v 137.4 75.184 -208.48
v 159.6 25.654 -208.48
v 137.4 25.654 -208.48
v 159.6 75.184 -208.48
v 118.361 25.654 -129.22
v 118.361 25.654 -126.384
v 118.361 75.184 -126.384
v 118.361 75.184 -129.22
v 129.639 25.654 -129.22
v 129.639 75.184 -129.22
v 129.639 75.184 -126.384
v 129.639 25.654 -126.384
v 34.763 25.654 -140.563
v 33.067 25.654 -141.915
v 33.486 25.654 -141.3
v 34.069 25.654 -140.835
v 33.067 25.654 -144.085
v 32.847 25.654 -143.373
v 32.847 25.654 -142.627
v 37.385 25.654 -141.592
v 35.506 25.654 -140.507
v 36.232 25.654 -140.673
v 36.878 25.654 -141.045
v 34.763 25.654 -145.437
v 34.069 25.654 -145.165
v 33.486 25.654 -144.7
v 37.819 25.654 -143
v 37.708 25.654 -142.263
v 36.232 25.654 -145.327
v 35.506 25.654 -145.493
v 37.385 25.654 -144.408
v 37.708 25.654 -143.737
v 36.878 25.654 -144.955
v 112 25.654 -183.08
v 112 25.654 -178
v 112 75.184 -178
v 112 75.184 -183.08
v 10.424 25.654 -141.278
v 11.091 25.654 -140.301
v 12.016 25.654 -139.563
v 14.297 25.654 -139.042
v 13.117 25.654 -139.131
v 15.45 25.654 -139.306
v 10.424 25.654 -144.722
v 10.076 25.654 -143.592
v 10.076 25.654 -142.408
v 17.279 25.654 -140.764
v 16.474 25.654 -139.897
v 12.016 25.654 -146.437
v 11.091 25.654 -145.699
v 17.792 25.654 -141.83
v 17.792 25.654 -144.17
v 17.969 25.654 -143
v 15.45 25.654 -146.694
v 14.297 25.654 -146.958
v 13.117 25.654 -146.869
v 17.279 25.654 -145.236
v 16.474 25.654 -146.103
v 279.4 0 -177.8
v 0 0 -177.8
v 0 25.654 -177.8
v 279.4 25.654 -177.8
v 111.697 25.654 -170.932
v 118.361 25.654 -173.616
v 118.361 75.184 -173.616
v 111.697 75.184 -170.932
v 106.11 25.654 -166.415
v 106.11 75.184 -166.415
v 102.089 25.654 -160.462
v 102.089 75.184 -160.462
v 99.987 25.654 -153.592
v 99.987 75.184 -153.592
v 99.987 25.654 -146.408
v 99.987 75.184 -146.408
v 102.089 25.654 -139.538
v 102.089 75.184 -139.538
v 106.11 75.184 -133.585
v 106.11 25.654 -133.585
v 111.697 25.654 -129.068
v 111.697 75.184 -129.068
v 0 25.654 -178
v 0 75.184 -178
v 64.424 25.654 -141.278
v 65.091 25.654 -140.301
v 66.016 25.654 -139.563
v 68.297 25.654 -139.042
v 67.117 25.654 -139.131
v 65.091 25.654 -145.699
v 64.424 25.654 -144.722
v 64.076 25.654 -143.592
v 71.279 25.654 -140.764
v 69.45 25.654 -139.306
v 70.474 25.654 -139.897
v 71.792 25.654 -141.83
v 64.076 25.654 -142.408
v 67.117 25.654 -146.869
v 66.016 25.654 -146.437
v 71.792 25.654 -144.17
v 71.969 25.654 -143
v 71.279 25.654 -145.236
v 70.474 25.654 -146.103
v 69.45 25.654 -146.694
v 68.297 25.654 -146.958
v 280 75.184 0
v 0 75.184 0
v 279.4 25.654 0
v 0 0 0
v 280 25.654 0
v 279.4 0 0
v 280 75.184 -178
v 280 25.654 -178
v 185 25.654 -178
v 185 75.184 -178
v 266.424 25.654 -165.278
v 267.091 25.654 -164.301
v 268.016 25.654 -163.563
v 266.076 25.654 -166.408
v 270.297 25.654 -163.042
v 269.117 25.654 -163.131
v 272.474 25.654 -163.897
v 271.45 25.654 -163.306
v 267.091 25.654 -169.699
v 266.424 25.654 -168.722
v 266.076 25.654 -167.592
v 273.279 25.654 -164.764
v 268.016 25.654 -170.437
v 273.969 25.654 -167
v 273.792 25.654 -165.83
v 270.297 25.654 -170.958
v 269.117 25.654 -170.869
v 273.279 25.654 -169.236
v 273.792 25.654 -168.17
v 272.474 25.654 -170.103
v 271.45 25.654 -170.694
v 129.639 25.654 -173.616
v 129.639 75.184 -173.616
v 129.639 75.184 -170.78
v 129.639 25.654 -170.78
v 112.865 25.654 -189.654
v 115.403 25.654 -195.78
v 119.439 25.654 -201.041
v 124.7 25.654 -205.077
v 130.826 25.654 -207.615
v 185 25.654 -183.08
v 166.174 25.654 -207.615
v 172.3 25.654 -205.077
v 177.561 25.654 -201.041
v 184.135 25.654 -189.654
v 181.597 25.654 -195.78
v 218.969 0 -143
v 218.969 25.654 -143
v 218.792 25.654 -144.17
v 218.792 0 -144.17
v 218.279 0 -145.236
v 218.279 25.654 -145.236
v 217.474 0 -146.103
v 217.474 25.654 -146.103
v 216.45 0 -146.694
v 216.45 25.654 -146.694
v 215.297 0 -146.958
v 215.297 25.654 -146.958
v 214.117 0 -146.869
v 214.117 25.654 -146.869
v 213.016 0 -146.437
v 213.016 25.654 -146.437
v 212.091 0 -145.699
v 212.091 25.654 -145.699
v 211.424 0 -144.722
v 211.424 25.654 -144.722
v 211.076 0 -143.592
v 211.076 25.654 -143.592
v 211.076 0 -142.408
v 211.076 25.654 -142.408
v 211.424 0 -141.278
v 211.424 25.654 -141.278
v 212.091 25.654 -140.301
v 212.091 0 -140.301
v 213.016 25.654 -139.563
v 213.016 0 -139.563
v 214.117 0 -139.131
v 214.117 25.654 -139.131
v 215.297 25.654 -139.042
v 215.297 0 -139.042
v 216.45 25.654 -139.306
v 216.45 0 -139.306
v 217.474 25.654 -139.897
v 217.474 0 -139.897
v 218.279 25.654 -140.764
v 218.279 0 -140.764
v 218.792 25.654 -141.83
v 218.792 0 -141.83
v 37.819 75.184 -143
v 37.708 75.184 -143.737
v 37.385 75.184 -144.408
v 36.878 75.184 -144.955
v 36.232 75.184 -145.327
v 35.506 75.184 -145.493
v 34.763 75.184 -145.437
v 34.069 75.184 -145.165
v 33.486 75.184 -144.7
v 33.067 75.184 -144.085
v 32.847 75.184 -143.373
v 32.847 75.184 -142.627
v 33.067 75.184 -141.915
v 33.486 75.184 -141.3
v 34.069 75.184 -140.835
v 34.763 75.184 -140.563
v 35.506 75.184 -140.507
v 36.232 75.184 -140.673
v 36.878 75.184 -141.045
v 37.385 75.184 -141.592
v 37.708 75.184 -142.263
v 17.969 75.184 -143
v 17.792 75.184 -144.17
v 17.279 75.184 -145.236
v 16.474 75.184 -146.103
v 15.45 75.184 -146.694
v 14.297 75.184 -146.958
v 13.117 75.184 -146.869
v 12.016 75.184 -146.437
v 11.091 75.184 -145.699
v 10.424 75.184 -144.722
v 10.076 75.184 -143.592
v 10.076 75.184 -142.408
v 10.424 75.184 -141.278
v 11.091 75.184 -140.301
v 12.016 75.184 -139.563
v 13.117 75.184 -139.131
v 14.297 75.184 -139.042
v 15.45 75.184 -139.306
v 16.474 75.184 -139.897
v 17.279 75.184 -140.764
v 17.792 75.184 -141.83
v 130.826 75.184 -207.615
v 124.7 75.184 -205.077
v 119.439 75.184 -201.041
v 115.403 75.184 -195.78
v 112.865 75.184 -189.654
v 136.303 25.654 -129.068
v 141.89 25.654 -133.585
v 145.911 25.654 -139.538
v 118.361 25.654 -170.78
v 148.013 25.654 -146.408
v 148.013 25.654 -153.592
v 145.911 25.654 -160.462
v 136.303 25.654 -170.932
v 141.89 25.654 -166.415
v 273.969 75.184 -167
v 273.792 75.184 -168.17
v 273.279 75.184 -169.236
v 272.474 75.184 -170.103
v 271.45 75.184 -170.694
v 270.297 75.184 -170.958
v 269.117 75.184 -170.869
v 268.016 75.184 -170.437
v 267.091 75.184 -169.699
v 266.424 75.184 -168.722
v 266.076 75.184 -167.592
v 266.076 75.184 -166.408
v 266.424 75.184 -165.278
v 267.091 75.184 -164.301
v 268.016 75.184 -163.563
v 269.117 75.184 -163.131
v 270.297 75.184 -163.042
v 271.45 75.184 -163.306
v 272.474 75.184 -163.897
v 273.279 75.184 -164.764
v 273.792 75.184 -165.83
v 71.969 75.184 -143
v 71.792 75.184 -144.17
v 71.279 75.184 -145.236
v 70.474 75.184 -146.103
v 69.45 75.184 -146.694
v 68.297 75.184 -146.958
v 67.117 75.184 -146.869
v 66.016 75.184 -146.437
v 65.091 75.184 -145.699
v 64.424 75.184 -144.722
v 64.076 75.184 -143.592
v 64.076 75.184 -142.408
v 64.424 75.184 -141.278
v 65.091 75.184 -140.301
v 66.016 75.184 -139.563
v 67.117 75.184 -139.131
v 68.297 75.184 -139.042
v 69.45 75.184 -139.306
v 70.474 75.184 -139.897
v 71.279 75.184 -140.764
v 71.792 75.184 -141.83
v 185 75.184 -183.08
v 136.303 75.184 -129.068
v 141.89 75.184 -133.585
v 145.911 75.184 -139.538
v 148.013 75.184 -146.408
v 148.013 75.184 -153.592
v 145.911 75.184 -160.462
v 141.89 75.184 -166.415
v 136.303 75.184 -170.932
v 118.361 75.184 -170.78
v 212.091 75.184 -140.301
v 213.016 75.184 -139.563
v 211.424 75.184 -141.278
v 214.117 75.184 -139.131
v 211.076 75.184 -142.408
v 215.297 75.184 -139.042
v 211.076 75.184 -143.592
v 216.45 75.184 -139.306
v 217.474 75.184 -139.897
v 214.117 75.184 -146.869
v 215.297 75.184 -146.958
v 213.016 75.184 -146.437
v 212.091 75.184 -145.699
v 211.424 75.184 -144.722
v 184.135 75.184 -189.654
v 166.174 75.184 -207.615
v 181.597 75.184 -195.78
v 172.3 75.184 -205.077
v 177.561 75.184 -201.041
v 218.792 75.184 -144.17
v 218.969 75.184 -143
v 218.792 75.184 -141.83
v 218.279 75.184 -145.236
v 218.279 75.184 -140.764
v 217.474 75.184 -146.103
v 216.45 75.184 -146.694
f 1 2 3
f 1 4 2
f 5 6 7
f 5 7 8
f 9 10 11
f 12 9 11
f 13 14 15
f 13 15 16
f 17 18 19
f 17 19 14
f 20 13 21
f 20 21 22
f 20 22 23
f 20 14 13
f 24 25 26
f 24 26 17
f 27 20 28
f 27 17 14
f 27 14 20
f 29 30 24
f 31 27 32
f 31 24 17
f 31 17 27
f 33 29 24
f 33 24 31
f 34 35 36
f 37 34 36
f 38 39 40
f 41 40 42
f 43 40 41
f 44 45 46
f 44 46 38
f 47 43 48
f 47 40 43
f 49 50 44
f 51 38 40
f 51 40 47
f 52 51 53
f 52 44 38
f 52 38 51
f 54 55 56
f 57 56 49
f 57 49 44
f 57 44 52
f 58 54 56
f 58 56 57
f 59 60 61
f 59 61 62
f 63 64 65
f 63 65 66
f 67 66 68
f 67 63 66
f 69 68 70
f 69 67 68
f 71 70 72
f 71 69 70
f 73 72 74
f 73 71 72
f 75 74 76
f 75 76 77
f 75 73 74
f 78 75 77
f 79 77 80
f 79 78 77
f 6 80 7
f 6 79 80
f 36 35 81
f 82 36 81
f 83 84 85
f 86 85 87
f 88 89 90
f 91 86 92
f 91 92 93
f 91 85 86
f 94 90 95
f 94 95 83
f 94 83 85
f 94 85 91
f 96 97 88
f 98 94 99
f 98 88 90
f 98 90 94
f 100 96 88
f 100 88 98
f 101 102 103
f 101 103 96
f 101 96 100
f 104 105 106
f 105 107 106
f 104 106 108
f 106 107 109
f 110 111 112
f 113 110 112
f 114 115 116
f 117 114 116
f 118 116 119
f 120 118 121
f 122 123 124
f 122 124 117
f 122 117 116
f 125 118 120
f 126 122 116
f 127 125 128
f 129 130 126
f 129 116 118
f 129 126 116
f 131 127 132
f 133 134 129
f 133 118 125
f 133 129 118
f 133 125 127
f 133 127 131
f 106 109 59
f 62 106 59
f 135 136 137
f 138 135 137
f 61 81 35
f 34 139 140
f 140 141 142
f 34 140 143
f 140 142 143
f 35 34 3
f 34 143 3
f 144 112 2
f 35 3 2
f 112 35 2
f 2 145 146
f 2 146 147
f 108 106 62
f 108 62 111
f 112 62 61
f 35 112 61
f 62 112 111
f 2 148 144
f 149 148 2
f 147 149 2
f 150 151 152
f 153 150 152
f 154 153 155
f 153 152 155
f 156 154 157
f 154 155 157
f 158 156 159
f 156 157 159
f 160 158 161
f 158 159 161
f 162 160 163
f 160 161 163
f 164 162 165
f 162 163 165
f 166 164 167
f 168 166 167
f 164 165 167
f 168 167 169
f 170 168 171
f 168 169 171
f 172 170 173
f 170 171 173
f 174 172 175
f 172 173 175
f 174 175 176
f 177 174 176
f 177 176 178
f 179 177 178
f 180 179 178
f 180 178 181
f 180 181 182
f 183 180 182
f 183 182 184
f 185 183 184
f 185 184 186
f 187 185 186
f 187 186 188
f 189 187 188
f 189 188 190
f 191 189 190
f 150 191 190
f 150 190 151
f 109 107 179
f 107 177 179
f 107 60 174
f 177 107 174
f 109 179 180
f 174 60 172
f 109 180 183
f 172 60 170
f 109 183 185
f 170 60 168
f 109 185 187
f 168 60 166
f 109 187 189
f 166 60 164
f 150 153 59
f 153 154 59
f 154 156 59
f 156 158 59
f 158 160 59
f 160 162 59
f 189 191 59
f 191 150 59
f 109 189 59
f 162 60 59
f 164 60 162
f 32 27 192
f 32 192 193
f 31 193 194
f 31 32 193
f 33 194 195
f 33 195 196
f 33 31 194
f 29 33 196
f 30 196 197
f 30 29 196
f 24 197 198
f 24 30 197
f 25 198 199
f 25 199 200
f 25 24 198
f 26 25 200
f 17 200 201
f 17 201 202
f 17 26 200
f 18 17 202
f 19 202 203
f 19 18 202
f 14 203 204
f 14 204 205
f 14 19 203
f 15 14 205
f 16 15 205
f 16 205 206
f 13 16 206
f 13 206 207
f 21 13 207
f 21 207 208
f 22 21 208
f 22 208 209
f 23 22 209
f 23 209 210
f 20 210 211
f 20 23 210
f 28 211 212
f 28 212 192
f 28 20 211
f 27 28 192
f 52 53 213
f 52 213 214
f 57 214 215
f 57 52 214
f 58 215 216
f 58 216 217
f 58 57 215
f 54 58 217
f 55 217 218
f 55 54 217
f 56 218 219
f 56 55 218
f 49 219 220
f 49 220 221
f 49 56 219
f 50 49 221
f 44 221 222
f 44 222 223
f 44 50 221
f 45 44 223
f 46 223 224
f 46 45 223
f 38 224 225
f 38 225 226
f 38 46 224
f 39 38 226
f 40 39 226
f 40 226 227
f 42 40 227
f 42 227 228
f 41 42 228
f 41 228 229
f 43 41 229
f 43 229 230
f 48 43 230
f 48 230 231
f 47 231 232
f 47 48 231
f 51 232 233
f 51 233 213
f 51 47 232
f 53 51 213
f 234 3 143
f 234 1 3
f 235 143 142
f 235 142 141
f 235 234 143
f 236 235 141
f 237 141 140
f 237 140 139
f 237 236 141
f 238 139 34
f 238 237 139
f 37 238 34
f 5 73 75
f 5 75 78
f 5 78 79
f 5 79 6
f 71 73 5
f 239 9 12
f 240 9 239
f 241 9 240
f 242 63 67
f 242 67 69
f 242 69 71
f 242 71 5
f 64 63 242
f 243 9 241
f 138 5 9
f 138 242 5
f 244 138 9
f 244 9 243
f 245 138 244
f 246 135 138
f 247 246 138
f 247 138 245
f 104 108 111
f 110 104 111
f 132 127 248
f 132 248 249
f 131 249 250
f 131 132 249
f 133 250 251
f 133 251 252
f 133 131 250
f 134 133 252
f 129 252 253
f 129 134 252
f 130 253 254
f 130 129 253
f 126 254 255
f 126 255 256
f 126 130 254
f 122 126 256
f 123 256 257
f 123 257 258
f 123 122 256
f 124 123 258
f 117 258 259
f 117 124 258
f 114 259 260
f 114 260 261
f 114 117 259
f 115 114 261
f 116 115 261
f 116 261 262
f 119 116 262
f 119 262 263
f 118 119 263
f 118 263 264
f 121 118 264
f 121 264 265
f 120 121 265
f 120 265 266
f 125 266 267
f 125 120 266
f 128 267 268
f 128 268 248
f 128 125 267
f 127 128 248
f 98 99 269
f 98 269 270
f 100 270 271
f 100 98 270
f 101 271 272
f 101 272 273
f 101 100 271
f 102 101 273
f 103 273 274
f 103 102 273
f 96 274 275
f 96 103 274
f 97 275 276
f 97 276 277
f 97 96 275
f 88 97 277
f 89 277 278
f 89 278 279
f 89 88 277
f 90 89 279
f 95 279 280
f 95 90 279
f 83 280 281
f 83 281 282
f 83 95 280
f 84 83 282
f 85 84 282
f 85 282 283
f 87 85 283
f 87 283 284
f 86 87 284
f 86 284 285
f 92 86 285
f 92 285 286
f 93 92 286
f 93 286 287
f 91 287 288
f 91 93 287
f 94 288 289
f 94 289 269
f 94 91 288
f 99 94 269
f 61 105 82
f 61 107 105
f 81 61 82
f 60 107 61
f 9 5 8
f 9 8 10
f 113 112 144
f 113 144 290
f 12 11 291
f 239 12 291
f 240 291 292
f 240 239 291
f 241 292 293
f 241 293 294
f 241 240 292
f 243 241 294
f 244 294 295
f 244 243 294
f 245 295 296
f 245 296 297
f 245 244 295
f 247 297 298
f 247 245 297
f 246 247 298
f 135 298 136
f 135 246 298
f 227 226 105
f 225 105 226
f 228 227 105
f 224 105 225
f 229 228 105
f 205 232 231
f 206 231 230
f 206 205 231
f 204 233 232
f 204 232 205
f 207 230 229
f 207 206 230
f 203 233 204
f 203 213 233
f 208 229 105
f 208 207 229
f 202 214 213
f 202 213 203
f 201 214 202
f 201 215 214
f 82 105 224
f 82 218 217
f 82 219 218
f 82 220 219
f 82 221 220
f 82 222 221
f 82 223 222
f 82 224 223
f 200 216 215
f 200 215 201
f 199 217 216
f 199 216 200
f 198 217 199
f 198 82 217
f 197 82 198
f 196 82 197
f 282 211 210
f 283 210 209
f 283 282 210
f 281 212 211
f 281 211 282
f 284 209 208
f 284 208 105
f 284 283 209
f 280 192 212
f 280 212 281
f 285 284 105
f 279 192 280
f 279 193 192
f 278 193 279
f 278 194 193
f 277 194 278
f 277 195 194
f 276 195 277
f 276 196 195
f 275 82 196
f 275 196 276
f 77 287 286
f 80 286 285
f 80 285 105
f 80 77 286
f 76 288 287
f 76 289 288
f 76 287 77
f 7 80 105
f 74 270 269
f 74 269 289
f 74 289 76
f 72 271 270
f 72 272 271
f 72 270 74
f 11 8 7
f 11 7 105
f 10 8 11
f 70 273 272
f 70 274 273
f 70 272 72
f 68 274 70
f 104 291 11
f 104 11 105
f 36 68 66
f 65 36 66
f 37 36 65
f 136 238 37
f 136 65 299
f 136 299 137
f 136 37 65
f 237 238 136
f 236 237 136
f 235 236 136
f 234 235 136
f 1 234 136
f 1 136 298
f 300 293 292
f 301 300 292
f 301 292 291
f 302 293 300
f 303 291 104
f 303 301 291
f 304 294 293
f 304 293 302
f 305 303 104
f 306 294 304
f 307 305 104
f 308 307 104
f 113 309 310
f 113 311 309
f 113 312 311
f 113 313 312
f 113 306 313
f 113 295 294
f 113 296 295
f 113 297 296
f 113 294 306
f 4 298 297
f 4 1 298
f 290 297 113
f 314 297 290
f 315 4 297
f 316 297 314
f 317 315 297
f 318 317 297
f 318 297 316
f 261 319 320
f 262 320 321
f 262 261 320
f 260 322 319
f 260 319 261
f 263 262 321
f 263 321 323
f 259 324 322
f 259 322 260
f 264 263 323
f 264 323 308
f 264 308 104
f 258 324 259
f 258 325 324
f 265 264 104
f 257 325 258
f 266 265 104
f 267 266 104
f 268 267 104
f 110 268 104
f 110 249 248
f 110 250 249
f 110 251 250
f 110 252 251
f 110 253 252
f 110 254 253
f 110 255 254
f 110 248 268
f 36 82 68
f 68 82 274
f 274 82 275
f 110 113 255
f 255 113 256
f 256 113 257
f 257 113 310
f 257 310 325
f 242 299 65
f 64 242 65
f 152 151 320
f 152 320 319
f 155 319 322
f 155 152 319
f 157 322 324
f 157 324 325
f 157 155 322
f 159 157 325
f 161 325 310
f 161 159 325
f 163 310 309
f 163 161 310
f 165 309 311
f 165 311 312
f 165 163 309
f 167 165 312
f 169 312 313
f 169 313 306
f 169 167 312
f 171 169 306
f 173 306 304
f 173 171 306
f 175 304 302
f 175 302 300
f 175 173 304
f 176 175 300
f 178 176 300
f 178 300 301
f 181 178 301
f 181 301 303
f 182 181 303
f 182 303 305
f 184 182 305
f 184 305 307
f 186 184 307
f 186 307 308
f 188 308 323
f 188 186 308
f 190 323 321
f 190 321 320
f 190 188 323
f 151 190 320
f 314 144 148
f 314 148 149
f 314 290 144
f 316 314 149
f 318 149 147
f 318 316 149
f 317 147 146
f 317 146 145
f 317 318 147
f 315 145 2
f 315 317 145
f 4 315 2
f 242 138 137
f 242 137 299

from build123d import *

# Parameters (mm, degrees)
SKETCH1_W           = 279.4
SKETCH1_H           = 177.8
BOSS_EXTRUDE1_DEPTH = 25.654
SKETCH9_R           = 3.96875
CUT_EXTRUDE1_DEPTH  = 38.1
SKETCH9_7_R         = 2.5
SKETCH9_7_R_2       = 3.96875
BOSS_EXTRUDE2_DEPTH = 49.53
SKETCH13_W          = 127.6
SKETCH13_H          = 108.000000046
BOSS_EXTRUDE3_DEPTH = 49.53
SKETCH14_W          = 73
SKETCH14_H          = 49.53
BOSS_EXTRUDE4_DEPTH = 30.48
FILLET1_R           = 25.4
FILLET2_R           = 25.4


with BuildPart() as part:
    # Sketch1 → Boss-Extrude1 (new body)
    with BuildSketch(Plane(origin=(0, 0, 0), x_dir=(1, 0, 0), z_dir=(0, 1, 0))):
        with Locations((139.7, 88.9)):
            Rectangle(SKETCH1_W, SKETCH1_H)
    extrude(amount=BOSS_EXTRUDE1_DEPTH)

    # Sketch9 → Cut-Extrude1 (cut)
    with BuildSketch(Plane(origin=(0, 25.654, 0), x_dir=(1, 0, 0), z_dir=(0, 1, 0))):
        with Locations((215, 143)):
            Circle(SKETCH9_R)
    extrude(amount=-CUT_EXTRUDE1_DEPTH, mode=Mode.SUBTRACT)

    # Sketch9<7> → Boss-Extrude2 (add)
    with BuildSketch(Plane(origin=(0, 25.654, 0), x_dir=(1, 0, 0), z_dir=(0, 1, 0))):
        Polygon((0, 108.000000046), (127.6, 108.000000046), (127.6, 0), (280, 0), (280, 178), (0, 178), align=None)
        with Locations((35.318924397, 143)):
            Circle(SKETCH9_7_R, mode=Mode.SUBTRACT)
        with Locations((14, 143)):
            Circle(SKETCH9_7_R_2, mode=Mode.SUBTRACT)
        with Locations((68, 143)):
            Circle(SKETCH9_7_R_2, mode=Mode.SUBTRACT)
        with Locations((270, 167)):
            Circle(SKETCH9_7_R_2, mode=Mode.SUBTRACT)
        with Locations((215, 143)):
            Circle(SKETCH9_7_R_2, mode=Mode.SUBTRACT)
        with BuildLine():
            Line((129.639279667, 129.22), (129.639279667, 126.383968902))
            ThreePointArc((129.639279667, 126.383968902), (148.28, 150), (129.639279667, 173.616031098))
            Line((129.639279667, 173.616031098), (129.639279667, 170.78))
            Line((129.639279667, 170.78), (118.360720333, 170.78))
            Line((118.360720333, 170.78), (118.360720333, 173.616031098))
            ThreePointArc((118.360720333, 173.616031098), (99.72, 150), (118.360720333, 126.383968902))
            Line((118.360720333, 126.383968902), (118.360720333, 129.22))
            Line((118.360720333, 129.22), (129.639279667, 129.22))
        make_face(mode=Mode.SUBTRACT)
    extrude(amount=BOSS_EXTRUDE2_DEPTH)

    # Sketch13 → Boss-Extrude3 (add)
    with BuildSketch(Plane(origin=(0, 25.654, 0), x_dir=(1, 0, 0), z_dir=(0, 1, 0))):
        with Locations((63.8, 54.000000023)):
            Rectangle(SKETCH13_W, SKETCH13_H)
    extrude(amount=BOSS_EXTRUDE3_DEPTH)

    # Sketch14 → Boss-Extrude4 (add)
    with BuildSketch(Plane(origin=(0, 0, -178), x_dir=(-1, 0, 0), z_dir=(0, 0, -1))):
        with Locations((-148.500000008, 50.419)):
            Rectangle(SKETCH14_W, SKETCH14_H)
    extrude(amount=BOSS_EXTRUDE4_DEPTH)

    # Fillet1
    fillet1_edges = [part.edges().sort_by_distance(p)[0] for p in [
        (185.000000008, 50.419, -208.48),
    ]]
    fillet(fillet1_edges, radius=FILLET1_R)

    # Fillet2
    fillet2_edges = [part.edges().sort_by_distance(p)[0] for p in [
        (112.000000008, 50.419, -208.48),
    ]]
    fillet(fillet2_edges, radius=FILLET2_R)


solid = part.part
